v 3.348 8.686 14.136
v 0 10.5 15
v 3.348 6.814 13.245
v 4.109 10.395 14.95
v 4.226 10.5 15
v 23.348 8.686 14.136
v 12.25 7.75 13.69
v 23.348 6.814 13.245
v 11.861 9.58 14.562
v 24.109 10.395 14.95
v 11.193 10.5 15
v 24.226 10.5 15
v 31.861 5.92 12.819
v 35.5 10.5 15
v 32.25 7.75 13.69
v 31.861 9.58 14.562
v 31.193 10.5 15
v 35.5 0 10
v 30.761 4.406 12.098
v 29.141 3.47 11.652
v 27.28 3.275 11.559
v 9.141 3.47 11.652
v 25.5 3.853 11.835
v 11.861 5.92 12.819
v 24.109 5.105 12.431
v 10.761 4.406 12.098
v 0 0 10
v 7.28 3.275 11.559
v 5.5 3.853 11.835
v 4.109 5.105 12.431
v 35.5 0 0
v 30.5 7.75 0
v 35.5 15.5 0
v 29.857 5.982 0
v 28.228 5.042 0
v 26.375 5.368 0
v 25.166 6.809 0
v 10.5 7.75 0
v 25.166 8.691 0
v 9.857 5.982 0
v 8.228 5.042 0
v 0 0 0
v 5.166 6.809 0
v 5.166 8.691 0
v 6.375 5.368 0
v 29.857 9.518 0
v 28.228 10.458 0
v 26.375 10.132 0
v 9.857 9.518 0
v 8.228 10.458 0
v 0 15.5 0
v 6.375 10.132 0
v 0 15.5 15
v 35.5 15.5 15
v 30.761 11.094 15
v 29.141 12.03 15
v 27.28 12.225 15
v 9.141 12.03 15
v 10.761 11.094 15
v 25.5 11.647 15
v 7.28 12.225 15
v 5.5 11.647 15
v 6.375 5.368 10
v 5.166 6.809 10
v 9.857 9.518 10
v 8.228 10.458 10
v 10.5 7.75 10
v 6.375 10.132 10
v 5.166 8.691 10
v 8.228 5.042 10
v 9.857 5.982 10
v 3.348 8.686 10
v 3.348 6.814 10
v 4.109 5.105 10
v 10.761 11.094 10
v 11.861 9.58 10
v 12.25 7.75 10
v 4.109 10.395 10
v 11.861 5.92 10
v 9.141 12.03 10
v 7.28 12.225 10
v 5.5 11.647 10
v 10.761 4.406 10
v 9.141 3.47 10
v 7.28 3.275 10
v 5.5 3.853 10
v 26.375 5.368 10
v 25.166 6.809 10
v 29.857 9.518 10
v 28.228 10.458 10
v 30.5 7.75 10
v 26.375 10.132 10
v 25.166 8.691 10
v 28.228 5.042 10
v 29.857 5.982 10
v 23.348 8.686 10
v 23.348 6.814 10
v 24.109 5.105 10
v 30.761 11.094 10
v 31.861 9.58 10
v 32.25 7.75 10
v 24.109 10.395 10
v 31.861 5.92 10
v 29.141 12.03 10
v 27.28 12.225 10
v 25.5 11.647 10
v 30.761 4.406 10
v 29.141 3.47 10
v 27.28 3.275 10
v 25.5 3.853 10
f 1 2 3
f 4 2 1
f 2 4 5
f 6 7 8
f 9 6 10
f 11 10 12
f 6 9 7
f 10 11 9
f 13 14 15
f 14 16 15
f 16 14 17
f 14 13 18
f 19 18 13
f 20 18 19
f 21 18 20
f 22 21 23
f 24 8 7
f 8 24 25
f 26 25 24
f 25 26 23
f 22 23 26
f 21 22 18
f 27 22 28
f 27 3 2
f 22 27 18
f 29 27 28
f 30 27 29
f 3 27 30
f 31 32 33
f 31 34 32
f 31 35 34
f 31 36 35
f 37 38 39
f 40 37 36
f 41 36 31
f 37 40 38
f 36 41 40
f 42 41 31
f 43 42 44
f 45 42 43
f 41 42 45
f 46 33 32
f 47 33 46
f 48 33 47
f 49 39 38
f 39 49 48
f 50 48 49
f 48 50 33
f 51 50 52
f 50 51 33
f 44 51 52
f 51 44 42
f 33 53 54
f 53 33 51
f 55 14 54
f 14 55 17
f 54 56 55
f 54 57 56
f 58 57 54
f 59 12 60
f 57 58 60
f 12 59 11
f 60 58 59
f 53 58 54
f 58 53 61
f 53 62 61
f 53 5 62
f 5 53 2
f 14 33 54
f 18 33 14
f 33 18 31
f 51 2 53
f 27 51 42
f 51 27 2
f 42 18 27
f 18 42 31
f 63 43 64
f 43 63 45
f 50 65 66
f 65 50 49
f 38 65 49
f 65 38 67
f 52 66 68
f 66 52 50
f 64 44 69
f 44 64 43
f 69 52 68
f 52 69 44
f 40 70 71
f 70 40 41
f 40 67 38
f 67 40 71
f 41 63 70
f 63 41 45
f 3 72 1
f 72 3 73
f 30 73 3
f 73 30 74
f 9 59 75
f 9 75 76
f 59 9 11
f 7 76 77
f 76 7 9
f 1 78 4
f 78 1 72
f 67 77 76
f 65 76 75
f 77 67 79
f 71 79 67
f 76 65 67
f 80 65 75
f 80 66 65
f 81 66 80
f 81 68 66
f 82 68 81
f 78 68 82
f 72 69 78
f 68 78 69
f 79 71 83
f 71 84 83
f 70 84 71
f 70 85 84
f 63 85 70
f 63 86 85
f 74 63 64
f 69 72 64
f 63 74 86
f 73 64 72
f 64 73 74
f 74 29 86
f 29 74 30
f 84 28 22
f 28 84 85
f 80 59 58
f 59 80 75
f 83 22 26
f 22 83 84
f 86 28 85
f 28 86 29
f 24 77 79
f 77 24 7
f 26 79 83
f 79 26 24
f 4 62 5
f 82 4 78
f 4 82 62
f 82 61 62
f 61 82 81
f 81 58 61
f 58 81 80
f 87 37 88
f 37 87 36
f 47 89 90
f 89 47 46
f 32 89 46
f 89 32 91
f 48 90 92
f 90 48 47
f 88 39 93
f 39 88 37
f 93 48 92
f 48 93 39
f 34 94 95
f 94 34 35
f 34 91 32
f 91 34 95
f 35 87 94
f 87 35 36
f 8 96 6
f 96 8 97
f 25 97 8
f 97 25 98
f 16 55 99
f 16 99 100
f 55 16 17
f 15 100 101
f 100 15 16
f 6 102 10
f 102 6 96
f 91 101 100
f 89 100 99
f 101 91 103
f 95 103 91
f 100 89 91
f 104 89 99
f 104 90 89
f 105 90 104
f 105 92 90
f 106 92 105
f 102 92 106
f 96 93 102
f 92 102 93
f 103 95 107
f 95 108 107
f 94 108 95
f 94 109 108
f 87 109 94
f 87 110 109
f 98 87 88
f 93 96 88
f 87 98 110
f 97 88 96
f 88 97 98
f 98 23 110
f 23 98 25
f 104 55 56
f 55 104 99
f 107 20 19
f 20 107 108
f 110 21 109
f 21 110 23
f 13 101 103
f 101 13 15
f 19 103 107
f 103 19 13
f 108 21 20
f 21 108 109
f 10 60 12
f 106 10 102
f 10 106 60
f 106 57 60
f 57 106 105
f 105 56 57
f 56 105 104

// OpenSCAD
// Uncomment before final render
//$fa = 0.01;
//$fs = 0.25;

module xAxisEndstopStop() {
  difference() {
    hull() {
      cube([35.5, 15.5, 10]);
      translate([0, 10.5, 10]) {
        cube([35.5, 5, 5]);
      }
    }
    translate([7.75, 7.75, -1]) {
      cylinder(17, 2.75, 2.75);
    }
    translate([7.75, 7.75, 10]) {
      cylinder(6, 4.5, 4.5);
    }
    translate([27.75, 7.75, -1]) {
      cylinder(17, 2.75, 2.75);
    }
    translate([27.75, 7.75, 10]) {
      cylinder(6, 4.5, 4.5);
    }
  }
}

xAxisEndstopStop();
